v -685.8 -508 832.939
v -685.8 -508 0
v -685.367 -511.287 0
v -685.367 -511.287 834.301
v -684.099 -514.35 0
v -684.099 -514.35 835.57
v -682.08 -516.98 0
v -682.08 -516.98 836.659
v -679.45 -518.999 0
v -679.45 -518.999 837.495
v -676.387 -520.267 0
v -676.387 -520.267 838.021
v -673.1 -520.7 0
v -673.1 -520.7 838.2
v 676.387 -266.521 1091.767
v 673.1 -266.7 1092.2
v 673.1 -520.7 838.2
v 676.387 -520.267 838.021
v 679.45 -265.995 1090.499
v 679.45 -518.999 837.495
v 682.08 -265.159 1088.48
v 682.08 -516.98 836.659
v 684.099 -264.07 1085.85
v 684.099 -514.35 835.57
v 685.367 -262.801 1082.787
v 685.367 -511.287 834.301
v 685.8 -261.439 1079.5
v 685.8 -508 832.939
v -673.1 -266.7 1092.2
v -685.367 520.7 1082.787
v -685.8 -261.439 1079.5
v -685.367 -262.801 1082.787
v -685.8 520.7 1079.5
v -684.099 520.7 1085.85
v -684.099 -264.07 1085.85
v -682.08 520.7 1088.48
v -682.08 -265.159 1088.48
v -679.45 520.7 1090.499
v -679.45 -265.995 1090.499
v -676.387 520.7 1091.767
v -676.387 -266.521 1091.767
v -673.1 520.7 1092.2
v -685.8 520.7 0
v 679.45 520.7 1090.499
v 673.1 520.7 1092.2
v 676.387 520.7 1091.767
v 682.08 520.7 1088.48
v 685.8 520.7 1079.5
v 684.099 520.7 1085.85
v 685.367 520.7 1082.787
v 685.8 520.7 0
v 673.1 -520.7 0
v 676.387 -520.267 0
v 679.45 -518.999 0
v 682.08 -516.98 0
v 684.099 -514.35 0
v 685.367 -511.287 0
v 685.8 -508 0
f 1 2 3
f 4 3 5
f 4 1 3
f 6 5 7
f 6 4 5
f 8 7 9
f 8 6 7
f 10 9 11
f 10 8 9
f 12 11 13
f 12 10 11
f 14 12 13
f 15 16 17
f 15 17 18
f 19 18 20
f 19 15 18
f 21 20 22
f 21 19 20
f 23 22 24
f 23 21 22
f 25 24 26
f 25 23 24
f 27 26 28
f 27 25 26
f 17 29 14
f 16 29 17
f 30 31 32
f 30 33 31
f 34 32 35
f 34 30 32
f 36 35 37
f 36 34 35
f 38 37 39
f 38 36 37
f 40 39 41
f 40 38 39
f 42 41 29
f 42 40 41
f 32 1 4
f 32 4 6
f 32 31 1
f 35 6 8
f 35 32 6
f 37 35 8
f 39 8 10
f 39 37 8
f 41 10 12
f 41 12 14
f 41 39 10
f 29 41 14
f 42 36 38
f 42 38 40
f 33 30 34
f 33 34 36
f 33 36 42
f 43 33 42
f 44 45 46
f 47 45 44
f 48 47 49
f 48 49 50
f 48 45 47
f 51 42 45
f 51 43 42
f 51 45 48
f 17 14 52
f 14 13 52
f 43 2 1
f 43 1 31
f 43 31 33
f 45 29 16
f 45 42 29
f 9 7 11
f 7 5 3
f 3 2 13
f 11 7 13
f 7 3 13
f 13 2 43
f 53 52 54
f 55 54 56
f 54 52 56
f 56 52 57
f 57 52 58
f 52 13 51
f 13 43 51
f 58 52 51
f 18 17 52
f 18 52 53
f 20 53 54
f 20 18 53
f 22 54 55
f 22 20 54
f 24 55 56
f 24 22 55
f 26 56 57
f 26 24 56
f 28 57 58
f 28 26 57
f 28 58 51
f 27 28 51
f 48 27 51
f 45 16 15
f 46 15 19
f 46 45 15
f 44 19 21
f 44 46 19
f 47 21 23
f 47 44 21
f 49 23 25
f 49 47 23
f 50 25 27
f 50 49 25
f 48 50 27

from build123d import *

# Parameters (mm, degrees)
F0_W     = 1371.6
F0_H     = 1041.4
F1_DEPTH = 1092.2
F2_SIZE  = 254
F3_R     = 12.7


with BuildPart() as f1:
    # F0 (on Top) → F1 (new body)
    with BuildSketch(Plane.XY):
        Rectangle(F0_W, F0_H)
    extrude(amount=F1_DEPTH)

    # F2
    f2_edges = [f1.edges().sort_by_distance(p)[0] for p in [
        (0, -520.7, 1092.2),
    ]]
    chamfer(f2_edges, length=F2_SIZE)

    # F3
    f3_edges = [f1.edges().sort_by_distance(p)[0] for p in [
        (685.8, 127, 1092.2),
        (685.8, -393.7, 965.2),
        (685.8, -520.7, 419.1),
        (-685.8, 127, 1092.2),
        (-685.8, -393.7, 965.2),
        (-685.8, -520.7, 419.1),
    ]]
    fillet(f3_edges, radius=F3_R)


solid = f1.part
